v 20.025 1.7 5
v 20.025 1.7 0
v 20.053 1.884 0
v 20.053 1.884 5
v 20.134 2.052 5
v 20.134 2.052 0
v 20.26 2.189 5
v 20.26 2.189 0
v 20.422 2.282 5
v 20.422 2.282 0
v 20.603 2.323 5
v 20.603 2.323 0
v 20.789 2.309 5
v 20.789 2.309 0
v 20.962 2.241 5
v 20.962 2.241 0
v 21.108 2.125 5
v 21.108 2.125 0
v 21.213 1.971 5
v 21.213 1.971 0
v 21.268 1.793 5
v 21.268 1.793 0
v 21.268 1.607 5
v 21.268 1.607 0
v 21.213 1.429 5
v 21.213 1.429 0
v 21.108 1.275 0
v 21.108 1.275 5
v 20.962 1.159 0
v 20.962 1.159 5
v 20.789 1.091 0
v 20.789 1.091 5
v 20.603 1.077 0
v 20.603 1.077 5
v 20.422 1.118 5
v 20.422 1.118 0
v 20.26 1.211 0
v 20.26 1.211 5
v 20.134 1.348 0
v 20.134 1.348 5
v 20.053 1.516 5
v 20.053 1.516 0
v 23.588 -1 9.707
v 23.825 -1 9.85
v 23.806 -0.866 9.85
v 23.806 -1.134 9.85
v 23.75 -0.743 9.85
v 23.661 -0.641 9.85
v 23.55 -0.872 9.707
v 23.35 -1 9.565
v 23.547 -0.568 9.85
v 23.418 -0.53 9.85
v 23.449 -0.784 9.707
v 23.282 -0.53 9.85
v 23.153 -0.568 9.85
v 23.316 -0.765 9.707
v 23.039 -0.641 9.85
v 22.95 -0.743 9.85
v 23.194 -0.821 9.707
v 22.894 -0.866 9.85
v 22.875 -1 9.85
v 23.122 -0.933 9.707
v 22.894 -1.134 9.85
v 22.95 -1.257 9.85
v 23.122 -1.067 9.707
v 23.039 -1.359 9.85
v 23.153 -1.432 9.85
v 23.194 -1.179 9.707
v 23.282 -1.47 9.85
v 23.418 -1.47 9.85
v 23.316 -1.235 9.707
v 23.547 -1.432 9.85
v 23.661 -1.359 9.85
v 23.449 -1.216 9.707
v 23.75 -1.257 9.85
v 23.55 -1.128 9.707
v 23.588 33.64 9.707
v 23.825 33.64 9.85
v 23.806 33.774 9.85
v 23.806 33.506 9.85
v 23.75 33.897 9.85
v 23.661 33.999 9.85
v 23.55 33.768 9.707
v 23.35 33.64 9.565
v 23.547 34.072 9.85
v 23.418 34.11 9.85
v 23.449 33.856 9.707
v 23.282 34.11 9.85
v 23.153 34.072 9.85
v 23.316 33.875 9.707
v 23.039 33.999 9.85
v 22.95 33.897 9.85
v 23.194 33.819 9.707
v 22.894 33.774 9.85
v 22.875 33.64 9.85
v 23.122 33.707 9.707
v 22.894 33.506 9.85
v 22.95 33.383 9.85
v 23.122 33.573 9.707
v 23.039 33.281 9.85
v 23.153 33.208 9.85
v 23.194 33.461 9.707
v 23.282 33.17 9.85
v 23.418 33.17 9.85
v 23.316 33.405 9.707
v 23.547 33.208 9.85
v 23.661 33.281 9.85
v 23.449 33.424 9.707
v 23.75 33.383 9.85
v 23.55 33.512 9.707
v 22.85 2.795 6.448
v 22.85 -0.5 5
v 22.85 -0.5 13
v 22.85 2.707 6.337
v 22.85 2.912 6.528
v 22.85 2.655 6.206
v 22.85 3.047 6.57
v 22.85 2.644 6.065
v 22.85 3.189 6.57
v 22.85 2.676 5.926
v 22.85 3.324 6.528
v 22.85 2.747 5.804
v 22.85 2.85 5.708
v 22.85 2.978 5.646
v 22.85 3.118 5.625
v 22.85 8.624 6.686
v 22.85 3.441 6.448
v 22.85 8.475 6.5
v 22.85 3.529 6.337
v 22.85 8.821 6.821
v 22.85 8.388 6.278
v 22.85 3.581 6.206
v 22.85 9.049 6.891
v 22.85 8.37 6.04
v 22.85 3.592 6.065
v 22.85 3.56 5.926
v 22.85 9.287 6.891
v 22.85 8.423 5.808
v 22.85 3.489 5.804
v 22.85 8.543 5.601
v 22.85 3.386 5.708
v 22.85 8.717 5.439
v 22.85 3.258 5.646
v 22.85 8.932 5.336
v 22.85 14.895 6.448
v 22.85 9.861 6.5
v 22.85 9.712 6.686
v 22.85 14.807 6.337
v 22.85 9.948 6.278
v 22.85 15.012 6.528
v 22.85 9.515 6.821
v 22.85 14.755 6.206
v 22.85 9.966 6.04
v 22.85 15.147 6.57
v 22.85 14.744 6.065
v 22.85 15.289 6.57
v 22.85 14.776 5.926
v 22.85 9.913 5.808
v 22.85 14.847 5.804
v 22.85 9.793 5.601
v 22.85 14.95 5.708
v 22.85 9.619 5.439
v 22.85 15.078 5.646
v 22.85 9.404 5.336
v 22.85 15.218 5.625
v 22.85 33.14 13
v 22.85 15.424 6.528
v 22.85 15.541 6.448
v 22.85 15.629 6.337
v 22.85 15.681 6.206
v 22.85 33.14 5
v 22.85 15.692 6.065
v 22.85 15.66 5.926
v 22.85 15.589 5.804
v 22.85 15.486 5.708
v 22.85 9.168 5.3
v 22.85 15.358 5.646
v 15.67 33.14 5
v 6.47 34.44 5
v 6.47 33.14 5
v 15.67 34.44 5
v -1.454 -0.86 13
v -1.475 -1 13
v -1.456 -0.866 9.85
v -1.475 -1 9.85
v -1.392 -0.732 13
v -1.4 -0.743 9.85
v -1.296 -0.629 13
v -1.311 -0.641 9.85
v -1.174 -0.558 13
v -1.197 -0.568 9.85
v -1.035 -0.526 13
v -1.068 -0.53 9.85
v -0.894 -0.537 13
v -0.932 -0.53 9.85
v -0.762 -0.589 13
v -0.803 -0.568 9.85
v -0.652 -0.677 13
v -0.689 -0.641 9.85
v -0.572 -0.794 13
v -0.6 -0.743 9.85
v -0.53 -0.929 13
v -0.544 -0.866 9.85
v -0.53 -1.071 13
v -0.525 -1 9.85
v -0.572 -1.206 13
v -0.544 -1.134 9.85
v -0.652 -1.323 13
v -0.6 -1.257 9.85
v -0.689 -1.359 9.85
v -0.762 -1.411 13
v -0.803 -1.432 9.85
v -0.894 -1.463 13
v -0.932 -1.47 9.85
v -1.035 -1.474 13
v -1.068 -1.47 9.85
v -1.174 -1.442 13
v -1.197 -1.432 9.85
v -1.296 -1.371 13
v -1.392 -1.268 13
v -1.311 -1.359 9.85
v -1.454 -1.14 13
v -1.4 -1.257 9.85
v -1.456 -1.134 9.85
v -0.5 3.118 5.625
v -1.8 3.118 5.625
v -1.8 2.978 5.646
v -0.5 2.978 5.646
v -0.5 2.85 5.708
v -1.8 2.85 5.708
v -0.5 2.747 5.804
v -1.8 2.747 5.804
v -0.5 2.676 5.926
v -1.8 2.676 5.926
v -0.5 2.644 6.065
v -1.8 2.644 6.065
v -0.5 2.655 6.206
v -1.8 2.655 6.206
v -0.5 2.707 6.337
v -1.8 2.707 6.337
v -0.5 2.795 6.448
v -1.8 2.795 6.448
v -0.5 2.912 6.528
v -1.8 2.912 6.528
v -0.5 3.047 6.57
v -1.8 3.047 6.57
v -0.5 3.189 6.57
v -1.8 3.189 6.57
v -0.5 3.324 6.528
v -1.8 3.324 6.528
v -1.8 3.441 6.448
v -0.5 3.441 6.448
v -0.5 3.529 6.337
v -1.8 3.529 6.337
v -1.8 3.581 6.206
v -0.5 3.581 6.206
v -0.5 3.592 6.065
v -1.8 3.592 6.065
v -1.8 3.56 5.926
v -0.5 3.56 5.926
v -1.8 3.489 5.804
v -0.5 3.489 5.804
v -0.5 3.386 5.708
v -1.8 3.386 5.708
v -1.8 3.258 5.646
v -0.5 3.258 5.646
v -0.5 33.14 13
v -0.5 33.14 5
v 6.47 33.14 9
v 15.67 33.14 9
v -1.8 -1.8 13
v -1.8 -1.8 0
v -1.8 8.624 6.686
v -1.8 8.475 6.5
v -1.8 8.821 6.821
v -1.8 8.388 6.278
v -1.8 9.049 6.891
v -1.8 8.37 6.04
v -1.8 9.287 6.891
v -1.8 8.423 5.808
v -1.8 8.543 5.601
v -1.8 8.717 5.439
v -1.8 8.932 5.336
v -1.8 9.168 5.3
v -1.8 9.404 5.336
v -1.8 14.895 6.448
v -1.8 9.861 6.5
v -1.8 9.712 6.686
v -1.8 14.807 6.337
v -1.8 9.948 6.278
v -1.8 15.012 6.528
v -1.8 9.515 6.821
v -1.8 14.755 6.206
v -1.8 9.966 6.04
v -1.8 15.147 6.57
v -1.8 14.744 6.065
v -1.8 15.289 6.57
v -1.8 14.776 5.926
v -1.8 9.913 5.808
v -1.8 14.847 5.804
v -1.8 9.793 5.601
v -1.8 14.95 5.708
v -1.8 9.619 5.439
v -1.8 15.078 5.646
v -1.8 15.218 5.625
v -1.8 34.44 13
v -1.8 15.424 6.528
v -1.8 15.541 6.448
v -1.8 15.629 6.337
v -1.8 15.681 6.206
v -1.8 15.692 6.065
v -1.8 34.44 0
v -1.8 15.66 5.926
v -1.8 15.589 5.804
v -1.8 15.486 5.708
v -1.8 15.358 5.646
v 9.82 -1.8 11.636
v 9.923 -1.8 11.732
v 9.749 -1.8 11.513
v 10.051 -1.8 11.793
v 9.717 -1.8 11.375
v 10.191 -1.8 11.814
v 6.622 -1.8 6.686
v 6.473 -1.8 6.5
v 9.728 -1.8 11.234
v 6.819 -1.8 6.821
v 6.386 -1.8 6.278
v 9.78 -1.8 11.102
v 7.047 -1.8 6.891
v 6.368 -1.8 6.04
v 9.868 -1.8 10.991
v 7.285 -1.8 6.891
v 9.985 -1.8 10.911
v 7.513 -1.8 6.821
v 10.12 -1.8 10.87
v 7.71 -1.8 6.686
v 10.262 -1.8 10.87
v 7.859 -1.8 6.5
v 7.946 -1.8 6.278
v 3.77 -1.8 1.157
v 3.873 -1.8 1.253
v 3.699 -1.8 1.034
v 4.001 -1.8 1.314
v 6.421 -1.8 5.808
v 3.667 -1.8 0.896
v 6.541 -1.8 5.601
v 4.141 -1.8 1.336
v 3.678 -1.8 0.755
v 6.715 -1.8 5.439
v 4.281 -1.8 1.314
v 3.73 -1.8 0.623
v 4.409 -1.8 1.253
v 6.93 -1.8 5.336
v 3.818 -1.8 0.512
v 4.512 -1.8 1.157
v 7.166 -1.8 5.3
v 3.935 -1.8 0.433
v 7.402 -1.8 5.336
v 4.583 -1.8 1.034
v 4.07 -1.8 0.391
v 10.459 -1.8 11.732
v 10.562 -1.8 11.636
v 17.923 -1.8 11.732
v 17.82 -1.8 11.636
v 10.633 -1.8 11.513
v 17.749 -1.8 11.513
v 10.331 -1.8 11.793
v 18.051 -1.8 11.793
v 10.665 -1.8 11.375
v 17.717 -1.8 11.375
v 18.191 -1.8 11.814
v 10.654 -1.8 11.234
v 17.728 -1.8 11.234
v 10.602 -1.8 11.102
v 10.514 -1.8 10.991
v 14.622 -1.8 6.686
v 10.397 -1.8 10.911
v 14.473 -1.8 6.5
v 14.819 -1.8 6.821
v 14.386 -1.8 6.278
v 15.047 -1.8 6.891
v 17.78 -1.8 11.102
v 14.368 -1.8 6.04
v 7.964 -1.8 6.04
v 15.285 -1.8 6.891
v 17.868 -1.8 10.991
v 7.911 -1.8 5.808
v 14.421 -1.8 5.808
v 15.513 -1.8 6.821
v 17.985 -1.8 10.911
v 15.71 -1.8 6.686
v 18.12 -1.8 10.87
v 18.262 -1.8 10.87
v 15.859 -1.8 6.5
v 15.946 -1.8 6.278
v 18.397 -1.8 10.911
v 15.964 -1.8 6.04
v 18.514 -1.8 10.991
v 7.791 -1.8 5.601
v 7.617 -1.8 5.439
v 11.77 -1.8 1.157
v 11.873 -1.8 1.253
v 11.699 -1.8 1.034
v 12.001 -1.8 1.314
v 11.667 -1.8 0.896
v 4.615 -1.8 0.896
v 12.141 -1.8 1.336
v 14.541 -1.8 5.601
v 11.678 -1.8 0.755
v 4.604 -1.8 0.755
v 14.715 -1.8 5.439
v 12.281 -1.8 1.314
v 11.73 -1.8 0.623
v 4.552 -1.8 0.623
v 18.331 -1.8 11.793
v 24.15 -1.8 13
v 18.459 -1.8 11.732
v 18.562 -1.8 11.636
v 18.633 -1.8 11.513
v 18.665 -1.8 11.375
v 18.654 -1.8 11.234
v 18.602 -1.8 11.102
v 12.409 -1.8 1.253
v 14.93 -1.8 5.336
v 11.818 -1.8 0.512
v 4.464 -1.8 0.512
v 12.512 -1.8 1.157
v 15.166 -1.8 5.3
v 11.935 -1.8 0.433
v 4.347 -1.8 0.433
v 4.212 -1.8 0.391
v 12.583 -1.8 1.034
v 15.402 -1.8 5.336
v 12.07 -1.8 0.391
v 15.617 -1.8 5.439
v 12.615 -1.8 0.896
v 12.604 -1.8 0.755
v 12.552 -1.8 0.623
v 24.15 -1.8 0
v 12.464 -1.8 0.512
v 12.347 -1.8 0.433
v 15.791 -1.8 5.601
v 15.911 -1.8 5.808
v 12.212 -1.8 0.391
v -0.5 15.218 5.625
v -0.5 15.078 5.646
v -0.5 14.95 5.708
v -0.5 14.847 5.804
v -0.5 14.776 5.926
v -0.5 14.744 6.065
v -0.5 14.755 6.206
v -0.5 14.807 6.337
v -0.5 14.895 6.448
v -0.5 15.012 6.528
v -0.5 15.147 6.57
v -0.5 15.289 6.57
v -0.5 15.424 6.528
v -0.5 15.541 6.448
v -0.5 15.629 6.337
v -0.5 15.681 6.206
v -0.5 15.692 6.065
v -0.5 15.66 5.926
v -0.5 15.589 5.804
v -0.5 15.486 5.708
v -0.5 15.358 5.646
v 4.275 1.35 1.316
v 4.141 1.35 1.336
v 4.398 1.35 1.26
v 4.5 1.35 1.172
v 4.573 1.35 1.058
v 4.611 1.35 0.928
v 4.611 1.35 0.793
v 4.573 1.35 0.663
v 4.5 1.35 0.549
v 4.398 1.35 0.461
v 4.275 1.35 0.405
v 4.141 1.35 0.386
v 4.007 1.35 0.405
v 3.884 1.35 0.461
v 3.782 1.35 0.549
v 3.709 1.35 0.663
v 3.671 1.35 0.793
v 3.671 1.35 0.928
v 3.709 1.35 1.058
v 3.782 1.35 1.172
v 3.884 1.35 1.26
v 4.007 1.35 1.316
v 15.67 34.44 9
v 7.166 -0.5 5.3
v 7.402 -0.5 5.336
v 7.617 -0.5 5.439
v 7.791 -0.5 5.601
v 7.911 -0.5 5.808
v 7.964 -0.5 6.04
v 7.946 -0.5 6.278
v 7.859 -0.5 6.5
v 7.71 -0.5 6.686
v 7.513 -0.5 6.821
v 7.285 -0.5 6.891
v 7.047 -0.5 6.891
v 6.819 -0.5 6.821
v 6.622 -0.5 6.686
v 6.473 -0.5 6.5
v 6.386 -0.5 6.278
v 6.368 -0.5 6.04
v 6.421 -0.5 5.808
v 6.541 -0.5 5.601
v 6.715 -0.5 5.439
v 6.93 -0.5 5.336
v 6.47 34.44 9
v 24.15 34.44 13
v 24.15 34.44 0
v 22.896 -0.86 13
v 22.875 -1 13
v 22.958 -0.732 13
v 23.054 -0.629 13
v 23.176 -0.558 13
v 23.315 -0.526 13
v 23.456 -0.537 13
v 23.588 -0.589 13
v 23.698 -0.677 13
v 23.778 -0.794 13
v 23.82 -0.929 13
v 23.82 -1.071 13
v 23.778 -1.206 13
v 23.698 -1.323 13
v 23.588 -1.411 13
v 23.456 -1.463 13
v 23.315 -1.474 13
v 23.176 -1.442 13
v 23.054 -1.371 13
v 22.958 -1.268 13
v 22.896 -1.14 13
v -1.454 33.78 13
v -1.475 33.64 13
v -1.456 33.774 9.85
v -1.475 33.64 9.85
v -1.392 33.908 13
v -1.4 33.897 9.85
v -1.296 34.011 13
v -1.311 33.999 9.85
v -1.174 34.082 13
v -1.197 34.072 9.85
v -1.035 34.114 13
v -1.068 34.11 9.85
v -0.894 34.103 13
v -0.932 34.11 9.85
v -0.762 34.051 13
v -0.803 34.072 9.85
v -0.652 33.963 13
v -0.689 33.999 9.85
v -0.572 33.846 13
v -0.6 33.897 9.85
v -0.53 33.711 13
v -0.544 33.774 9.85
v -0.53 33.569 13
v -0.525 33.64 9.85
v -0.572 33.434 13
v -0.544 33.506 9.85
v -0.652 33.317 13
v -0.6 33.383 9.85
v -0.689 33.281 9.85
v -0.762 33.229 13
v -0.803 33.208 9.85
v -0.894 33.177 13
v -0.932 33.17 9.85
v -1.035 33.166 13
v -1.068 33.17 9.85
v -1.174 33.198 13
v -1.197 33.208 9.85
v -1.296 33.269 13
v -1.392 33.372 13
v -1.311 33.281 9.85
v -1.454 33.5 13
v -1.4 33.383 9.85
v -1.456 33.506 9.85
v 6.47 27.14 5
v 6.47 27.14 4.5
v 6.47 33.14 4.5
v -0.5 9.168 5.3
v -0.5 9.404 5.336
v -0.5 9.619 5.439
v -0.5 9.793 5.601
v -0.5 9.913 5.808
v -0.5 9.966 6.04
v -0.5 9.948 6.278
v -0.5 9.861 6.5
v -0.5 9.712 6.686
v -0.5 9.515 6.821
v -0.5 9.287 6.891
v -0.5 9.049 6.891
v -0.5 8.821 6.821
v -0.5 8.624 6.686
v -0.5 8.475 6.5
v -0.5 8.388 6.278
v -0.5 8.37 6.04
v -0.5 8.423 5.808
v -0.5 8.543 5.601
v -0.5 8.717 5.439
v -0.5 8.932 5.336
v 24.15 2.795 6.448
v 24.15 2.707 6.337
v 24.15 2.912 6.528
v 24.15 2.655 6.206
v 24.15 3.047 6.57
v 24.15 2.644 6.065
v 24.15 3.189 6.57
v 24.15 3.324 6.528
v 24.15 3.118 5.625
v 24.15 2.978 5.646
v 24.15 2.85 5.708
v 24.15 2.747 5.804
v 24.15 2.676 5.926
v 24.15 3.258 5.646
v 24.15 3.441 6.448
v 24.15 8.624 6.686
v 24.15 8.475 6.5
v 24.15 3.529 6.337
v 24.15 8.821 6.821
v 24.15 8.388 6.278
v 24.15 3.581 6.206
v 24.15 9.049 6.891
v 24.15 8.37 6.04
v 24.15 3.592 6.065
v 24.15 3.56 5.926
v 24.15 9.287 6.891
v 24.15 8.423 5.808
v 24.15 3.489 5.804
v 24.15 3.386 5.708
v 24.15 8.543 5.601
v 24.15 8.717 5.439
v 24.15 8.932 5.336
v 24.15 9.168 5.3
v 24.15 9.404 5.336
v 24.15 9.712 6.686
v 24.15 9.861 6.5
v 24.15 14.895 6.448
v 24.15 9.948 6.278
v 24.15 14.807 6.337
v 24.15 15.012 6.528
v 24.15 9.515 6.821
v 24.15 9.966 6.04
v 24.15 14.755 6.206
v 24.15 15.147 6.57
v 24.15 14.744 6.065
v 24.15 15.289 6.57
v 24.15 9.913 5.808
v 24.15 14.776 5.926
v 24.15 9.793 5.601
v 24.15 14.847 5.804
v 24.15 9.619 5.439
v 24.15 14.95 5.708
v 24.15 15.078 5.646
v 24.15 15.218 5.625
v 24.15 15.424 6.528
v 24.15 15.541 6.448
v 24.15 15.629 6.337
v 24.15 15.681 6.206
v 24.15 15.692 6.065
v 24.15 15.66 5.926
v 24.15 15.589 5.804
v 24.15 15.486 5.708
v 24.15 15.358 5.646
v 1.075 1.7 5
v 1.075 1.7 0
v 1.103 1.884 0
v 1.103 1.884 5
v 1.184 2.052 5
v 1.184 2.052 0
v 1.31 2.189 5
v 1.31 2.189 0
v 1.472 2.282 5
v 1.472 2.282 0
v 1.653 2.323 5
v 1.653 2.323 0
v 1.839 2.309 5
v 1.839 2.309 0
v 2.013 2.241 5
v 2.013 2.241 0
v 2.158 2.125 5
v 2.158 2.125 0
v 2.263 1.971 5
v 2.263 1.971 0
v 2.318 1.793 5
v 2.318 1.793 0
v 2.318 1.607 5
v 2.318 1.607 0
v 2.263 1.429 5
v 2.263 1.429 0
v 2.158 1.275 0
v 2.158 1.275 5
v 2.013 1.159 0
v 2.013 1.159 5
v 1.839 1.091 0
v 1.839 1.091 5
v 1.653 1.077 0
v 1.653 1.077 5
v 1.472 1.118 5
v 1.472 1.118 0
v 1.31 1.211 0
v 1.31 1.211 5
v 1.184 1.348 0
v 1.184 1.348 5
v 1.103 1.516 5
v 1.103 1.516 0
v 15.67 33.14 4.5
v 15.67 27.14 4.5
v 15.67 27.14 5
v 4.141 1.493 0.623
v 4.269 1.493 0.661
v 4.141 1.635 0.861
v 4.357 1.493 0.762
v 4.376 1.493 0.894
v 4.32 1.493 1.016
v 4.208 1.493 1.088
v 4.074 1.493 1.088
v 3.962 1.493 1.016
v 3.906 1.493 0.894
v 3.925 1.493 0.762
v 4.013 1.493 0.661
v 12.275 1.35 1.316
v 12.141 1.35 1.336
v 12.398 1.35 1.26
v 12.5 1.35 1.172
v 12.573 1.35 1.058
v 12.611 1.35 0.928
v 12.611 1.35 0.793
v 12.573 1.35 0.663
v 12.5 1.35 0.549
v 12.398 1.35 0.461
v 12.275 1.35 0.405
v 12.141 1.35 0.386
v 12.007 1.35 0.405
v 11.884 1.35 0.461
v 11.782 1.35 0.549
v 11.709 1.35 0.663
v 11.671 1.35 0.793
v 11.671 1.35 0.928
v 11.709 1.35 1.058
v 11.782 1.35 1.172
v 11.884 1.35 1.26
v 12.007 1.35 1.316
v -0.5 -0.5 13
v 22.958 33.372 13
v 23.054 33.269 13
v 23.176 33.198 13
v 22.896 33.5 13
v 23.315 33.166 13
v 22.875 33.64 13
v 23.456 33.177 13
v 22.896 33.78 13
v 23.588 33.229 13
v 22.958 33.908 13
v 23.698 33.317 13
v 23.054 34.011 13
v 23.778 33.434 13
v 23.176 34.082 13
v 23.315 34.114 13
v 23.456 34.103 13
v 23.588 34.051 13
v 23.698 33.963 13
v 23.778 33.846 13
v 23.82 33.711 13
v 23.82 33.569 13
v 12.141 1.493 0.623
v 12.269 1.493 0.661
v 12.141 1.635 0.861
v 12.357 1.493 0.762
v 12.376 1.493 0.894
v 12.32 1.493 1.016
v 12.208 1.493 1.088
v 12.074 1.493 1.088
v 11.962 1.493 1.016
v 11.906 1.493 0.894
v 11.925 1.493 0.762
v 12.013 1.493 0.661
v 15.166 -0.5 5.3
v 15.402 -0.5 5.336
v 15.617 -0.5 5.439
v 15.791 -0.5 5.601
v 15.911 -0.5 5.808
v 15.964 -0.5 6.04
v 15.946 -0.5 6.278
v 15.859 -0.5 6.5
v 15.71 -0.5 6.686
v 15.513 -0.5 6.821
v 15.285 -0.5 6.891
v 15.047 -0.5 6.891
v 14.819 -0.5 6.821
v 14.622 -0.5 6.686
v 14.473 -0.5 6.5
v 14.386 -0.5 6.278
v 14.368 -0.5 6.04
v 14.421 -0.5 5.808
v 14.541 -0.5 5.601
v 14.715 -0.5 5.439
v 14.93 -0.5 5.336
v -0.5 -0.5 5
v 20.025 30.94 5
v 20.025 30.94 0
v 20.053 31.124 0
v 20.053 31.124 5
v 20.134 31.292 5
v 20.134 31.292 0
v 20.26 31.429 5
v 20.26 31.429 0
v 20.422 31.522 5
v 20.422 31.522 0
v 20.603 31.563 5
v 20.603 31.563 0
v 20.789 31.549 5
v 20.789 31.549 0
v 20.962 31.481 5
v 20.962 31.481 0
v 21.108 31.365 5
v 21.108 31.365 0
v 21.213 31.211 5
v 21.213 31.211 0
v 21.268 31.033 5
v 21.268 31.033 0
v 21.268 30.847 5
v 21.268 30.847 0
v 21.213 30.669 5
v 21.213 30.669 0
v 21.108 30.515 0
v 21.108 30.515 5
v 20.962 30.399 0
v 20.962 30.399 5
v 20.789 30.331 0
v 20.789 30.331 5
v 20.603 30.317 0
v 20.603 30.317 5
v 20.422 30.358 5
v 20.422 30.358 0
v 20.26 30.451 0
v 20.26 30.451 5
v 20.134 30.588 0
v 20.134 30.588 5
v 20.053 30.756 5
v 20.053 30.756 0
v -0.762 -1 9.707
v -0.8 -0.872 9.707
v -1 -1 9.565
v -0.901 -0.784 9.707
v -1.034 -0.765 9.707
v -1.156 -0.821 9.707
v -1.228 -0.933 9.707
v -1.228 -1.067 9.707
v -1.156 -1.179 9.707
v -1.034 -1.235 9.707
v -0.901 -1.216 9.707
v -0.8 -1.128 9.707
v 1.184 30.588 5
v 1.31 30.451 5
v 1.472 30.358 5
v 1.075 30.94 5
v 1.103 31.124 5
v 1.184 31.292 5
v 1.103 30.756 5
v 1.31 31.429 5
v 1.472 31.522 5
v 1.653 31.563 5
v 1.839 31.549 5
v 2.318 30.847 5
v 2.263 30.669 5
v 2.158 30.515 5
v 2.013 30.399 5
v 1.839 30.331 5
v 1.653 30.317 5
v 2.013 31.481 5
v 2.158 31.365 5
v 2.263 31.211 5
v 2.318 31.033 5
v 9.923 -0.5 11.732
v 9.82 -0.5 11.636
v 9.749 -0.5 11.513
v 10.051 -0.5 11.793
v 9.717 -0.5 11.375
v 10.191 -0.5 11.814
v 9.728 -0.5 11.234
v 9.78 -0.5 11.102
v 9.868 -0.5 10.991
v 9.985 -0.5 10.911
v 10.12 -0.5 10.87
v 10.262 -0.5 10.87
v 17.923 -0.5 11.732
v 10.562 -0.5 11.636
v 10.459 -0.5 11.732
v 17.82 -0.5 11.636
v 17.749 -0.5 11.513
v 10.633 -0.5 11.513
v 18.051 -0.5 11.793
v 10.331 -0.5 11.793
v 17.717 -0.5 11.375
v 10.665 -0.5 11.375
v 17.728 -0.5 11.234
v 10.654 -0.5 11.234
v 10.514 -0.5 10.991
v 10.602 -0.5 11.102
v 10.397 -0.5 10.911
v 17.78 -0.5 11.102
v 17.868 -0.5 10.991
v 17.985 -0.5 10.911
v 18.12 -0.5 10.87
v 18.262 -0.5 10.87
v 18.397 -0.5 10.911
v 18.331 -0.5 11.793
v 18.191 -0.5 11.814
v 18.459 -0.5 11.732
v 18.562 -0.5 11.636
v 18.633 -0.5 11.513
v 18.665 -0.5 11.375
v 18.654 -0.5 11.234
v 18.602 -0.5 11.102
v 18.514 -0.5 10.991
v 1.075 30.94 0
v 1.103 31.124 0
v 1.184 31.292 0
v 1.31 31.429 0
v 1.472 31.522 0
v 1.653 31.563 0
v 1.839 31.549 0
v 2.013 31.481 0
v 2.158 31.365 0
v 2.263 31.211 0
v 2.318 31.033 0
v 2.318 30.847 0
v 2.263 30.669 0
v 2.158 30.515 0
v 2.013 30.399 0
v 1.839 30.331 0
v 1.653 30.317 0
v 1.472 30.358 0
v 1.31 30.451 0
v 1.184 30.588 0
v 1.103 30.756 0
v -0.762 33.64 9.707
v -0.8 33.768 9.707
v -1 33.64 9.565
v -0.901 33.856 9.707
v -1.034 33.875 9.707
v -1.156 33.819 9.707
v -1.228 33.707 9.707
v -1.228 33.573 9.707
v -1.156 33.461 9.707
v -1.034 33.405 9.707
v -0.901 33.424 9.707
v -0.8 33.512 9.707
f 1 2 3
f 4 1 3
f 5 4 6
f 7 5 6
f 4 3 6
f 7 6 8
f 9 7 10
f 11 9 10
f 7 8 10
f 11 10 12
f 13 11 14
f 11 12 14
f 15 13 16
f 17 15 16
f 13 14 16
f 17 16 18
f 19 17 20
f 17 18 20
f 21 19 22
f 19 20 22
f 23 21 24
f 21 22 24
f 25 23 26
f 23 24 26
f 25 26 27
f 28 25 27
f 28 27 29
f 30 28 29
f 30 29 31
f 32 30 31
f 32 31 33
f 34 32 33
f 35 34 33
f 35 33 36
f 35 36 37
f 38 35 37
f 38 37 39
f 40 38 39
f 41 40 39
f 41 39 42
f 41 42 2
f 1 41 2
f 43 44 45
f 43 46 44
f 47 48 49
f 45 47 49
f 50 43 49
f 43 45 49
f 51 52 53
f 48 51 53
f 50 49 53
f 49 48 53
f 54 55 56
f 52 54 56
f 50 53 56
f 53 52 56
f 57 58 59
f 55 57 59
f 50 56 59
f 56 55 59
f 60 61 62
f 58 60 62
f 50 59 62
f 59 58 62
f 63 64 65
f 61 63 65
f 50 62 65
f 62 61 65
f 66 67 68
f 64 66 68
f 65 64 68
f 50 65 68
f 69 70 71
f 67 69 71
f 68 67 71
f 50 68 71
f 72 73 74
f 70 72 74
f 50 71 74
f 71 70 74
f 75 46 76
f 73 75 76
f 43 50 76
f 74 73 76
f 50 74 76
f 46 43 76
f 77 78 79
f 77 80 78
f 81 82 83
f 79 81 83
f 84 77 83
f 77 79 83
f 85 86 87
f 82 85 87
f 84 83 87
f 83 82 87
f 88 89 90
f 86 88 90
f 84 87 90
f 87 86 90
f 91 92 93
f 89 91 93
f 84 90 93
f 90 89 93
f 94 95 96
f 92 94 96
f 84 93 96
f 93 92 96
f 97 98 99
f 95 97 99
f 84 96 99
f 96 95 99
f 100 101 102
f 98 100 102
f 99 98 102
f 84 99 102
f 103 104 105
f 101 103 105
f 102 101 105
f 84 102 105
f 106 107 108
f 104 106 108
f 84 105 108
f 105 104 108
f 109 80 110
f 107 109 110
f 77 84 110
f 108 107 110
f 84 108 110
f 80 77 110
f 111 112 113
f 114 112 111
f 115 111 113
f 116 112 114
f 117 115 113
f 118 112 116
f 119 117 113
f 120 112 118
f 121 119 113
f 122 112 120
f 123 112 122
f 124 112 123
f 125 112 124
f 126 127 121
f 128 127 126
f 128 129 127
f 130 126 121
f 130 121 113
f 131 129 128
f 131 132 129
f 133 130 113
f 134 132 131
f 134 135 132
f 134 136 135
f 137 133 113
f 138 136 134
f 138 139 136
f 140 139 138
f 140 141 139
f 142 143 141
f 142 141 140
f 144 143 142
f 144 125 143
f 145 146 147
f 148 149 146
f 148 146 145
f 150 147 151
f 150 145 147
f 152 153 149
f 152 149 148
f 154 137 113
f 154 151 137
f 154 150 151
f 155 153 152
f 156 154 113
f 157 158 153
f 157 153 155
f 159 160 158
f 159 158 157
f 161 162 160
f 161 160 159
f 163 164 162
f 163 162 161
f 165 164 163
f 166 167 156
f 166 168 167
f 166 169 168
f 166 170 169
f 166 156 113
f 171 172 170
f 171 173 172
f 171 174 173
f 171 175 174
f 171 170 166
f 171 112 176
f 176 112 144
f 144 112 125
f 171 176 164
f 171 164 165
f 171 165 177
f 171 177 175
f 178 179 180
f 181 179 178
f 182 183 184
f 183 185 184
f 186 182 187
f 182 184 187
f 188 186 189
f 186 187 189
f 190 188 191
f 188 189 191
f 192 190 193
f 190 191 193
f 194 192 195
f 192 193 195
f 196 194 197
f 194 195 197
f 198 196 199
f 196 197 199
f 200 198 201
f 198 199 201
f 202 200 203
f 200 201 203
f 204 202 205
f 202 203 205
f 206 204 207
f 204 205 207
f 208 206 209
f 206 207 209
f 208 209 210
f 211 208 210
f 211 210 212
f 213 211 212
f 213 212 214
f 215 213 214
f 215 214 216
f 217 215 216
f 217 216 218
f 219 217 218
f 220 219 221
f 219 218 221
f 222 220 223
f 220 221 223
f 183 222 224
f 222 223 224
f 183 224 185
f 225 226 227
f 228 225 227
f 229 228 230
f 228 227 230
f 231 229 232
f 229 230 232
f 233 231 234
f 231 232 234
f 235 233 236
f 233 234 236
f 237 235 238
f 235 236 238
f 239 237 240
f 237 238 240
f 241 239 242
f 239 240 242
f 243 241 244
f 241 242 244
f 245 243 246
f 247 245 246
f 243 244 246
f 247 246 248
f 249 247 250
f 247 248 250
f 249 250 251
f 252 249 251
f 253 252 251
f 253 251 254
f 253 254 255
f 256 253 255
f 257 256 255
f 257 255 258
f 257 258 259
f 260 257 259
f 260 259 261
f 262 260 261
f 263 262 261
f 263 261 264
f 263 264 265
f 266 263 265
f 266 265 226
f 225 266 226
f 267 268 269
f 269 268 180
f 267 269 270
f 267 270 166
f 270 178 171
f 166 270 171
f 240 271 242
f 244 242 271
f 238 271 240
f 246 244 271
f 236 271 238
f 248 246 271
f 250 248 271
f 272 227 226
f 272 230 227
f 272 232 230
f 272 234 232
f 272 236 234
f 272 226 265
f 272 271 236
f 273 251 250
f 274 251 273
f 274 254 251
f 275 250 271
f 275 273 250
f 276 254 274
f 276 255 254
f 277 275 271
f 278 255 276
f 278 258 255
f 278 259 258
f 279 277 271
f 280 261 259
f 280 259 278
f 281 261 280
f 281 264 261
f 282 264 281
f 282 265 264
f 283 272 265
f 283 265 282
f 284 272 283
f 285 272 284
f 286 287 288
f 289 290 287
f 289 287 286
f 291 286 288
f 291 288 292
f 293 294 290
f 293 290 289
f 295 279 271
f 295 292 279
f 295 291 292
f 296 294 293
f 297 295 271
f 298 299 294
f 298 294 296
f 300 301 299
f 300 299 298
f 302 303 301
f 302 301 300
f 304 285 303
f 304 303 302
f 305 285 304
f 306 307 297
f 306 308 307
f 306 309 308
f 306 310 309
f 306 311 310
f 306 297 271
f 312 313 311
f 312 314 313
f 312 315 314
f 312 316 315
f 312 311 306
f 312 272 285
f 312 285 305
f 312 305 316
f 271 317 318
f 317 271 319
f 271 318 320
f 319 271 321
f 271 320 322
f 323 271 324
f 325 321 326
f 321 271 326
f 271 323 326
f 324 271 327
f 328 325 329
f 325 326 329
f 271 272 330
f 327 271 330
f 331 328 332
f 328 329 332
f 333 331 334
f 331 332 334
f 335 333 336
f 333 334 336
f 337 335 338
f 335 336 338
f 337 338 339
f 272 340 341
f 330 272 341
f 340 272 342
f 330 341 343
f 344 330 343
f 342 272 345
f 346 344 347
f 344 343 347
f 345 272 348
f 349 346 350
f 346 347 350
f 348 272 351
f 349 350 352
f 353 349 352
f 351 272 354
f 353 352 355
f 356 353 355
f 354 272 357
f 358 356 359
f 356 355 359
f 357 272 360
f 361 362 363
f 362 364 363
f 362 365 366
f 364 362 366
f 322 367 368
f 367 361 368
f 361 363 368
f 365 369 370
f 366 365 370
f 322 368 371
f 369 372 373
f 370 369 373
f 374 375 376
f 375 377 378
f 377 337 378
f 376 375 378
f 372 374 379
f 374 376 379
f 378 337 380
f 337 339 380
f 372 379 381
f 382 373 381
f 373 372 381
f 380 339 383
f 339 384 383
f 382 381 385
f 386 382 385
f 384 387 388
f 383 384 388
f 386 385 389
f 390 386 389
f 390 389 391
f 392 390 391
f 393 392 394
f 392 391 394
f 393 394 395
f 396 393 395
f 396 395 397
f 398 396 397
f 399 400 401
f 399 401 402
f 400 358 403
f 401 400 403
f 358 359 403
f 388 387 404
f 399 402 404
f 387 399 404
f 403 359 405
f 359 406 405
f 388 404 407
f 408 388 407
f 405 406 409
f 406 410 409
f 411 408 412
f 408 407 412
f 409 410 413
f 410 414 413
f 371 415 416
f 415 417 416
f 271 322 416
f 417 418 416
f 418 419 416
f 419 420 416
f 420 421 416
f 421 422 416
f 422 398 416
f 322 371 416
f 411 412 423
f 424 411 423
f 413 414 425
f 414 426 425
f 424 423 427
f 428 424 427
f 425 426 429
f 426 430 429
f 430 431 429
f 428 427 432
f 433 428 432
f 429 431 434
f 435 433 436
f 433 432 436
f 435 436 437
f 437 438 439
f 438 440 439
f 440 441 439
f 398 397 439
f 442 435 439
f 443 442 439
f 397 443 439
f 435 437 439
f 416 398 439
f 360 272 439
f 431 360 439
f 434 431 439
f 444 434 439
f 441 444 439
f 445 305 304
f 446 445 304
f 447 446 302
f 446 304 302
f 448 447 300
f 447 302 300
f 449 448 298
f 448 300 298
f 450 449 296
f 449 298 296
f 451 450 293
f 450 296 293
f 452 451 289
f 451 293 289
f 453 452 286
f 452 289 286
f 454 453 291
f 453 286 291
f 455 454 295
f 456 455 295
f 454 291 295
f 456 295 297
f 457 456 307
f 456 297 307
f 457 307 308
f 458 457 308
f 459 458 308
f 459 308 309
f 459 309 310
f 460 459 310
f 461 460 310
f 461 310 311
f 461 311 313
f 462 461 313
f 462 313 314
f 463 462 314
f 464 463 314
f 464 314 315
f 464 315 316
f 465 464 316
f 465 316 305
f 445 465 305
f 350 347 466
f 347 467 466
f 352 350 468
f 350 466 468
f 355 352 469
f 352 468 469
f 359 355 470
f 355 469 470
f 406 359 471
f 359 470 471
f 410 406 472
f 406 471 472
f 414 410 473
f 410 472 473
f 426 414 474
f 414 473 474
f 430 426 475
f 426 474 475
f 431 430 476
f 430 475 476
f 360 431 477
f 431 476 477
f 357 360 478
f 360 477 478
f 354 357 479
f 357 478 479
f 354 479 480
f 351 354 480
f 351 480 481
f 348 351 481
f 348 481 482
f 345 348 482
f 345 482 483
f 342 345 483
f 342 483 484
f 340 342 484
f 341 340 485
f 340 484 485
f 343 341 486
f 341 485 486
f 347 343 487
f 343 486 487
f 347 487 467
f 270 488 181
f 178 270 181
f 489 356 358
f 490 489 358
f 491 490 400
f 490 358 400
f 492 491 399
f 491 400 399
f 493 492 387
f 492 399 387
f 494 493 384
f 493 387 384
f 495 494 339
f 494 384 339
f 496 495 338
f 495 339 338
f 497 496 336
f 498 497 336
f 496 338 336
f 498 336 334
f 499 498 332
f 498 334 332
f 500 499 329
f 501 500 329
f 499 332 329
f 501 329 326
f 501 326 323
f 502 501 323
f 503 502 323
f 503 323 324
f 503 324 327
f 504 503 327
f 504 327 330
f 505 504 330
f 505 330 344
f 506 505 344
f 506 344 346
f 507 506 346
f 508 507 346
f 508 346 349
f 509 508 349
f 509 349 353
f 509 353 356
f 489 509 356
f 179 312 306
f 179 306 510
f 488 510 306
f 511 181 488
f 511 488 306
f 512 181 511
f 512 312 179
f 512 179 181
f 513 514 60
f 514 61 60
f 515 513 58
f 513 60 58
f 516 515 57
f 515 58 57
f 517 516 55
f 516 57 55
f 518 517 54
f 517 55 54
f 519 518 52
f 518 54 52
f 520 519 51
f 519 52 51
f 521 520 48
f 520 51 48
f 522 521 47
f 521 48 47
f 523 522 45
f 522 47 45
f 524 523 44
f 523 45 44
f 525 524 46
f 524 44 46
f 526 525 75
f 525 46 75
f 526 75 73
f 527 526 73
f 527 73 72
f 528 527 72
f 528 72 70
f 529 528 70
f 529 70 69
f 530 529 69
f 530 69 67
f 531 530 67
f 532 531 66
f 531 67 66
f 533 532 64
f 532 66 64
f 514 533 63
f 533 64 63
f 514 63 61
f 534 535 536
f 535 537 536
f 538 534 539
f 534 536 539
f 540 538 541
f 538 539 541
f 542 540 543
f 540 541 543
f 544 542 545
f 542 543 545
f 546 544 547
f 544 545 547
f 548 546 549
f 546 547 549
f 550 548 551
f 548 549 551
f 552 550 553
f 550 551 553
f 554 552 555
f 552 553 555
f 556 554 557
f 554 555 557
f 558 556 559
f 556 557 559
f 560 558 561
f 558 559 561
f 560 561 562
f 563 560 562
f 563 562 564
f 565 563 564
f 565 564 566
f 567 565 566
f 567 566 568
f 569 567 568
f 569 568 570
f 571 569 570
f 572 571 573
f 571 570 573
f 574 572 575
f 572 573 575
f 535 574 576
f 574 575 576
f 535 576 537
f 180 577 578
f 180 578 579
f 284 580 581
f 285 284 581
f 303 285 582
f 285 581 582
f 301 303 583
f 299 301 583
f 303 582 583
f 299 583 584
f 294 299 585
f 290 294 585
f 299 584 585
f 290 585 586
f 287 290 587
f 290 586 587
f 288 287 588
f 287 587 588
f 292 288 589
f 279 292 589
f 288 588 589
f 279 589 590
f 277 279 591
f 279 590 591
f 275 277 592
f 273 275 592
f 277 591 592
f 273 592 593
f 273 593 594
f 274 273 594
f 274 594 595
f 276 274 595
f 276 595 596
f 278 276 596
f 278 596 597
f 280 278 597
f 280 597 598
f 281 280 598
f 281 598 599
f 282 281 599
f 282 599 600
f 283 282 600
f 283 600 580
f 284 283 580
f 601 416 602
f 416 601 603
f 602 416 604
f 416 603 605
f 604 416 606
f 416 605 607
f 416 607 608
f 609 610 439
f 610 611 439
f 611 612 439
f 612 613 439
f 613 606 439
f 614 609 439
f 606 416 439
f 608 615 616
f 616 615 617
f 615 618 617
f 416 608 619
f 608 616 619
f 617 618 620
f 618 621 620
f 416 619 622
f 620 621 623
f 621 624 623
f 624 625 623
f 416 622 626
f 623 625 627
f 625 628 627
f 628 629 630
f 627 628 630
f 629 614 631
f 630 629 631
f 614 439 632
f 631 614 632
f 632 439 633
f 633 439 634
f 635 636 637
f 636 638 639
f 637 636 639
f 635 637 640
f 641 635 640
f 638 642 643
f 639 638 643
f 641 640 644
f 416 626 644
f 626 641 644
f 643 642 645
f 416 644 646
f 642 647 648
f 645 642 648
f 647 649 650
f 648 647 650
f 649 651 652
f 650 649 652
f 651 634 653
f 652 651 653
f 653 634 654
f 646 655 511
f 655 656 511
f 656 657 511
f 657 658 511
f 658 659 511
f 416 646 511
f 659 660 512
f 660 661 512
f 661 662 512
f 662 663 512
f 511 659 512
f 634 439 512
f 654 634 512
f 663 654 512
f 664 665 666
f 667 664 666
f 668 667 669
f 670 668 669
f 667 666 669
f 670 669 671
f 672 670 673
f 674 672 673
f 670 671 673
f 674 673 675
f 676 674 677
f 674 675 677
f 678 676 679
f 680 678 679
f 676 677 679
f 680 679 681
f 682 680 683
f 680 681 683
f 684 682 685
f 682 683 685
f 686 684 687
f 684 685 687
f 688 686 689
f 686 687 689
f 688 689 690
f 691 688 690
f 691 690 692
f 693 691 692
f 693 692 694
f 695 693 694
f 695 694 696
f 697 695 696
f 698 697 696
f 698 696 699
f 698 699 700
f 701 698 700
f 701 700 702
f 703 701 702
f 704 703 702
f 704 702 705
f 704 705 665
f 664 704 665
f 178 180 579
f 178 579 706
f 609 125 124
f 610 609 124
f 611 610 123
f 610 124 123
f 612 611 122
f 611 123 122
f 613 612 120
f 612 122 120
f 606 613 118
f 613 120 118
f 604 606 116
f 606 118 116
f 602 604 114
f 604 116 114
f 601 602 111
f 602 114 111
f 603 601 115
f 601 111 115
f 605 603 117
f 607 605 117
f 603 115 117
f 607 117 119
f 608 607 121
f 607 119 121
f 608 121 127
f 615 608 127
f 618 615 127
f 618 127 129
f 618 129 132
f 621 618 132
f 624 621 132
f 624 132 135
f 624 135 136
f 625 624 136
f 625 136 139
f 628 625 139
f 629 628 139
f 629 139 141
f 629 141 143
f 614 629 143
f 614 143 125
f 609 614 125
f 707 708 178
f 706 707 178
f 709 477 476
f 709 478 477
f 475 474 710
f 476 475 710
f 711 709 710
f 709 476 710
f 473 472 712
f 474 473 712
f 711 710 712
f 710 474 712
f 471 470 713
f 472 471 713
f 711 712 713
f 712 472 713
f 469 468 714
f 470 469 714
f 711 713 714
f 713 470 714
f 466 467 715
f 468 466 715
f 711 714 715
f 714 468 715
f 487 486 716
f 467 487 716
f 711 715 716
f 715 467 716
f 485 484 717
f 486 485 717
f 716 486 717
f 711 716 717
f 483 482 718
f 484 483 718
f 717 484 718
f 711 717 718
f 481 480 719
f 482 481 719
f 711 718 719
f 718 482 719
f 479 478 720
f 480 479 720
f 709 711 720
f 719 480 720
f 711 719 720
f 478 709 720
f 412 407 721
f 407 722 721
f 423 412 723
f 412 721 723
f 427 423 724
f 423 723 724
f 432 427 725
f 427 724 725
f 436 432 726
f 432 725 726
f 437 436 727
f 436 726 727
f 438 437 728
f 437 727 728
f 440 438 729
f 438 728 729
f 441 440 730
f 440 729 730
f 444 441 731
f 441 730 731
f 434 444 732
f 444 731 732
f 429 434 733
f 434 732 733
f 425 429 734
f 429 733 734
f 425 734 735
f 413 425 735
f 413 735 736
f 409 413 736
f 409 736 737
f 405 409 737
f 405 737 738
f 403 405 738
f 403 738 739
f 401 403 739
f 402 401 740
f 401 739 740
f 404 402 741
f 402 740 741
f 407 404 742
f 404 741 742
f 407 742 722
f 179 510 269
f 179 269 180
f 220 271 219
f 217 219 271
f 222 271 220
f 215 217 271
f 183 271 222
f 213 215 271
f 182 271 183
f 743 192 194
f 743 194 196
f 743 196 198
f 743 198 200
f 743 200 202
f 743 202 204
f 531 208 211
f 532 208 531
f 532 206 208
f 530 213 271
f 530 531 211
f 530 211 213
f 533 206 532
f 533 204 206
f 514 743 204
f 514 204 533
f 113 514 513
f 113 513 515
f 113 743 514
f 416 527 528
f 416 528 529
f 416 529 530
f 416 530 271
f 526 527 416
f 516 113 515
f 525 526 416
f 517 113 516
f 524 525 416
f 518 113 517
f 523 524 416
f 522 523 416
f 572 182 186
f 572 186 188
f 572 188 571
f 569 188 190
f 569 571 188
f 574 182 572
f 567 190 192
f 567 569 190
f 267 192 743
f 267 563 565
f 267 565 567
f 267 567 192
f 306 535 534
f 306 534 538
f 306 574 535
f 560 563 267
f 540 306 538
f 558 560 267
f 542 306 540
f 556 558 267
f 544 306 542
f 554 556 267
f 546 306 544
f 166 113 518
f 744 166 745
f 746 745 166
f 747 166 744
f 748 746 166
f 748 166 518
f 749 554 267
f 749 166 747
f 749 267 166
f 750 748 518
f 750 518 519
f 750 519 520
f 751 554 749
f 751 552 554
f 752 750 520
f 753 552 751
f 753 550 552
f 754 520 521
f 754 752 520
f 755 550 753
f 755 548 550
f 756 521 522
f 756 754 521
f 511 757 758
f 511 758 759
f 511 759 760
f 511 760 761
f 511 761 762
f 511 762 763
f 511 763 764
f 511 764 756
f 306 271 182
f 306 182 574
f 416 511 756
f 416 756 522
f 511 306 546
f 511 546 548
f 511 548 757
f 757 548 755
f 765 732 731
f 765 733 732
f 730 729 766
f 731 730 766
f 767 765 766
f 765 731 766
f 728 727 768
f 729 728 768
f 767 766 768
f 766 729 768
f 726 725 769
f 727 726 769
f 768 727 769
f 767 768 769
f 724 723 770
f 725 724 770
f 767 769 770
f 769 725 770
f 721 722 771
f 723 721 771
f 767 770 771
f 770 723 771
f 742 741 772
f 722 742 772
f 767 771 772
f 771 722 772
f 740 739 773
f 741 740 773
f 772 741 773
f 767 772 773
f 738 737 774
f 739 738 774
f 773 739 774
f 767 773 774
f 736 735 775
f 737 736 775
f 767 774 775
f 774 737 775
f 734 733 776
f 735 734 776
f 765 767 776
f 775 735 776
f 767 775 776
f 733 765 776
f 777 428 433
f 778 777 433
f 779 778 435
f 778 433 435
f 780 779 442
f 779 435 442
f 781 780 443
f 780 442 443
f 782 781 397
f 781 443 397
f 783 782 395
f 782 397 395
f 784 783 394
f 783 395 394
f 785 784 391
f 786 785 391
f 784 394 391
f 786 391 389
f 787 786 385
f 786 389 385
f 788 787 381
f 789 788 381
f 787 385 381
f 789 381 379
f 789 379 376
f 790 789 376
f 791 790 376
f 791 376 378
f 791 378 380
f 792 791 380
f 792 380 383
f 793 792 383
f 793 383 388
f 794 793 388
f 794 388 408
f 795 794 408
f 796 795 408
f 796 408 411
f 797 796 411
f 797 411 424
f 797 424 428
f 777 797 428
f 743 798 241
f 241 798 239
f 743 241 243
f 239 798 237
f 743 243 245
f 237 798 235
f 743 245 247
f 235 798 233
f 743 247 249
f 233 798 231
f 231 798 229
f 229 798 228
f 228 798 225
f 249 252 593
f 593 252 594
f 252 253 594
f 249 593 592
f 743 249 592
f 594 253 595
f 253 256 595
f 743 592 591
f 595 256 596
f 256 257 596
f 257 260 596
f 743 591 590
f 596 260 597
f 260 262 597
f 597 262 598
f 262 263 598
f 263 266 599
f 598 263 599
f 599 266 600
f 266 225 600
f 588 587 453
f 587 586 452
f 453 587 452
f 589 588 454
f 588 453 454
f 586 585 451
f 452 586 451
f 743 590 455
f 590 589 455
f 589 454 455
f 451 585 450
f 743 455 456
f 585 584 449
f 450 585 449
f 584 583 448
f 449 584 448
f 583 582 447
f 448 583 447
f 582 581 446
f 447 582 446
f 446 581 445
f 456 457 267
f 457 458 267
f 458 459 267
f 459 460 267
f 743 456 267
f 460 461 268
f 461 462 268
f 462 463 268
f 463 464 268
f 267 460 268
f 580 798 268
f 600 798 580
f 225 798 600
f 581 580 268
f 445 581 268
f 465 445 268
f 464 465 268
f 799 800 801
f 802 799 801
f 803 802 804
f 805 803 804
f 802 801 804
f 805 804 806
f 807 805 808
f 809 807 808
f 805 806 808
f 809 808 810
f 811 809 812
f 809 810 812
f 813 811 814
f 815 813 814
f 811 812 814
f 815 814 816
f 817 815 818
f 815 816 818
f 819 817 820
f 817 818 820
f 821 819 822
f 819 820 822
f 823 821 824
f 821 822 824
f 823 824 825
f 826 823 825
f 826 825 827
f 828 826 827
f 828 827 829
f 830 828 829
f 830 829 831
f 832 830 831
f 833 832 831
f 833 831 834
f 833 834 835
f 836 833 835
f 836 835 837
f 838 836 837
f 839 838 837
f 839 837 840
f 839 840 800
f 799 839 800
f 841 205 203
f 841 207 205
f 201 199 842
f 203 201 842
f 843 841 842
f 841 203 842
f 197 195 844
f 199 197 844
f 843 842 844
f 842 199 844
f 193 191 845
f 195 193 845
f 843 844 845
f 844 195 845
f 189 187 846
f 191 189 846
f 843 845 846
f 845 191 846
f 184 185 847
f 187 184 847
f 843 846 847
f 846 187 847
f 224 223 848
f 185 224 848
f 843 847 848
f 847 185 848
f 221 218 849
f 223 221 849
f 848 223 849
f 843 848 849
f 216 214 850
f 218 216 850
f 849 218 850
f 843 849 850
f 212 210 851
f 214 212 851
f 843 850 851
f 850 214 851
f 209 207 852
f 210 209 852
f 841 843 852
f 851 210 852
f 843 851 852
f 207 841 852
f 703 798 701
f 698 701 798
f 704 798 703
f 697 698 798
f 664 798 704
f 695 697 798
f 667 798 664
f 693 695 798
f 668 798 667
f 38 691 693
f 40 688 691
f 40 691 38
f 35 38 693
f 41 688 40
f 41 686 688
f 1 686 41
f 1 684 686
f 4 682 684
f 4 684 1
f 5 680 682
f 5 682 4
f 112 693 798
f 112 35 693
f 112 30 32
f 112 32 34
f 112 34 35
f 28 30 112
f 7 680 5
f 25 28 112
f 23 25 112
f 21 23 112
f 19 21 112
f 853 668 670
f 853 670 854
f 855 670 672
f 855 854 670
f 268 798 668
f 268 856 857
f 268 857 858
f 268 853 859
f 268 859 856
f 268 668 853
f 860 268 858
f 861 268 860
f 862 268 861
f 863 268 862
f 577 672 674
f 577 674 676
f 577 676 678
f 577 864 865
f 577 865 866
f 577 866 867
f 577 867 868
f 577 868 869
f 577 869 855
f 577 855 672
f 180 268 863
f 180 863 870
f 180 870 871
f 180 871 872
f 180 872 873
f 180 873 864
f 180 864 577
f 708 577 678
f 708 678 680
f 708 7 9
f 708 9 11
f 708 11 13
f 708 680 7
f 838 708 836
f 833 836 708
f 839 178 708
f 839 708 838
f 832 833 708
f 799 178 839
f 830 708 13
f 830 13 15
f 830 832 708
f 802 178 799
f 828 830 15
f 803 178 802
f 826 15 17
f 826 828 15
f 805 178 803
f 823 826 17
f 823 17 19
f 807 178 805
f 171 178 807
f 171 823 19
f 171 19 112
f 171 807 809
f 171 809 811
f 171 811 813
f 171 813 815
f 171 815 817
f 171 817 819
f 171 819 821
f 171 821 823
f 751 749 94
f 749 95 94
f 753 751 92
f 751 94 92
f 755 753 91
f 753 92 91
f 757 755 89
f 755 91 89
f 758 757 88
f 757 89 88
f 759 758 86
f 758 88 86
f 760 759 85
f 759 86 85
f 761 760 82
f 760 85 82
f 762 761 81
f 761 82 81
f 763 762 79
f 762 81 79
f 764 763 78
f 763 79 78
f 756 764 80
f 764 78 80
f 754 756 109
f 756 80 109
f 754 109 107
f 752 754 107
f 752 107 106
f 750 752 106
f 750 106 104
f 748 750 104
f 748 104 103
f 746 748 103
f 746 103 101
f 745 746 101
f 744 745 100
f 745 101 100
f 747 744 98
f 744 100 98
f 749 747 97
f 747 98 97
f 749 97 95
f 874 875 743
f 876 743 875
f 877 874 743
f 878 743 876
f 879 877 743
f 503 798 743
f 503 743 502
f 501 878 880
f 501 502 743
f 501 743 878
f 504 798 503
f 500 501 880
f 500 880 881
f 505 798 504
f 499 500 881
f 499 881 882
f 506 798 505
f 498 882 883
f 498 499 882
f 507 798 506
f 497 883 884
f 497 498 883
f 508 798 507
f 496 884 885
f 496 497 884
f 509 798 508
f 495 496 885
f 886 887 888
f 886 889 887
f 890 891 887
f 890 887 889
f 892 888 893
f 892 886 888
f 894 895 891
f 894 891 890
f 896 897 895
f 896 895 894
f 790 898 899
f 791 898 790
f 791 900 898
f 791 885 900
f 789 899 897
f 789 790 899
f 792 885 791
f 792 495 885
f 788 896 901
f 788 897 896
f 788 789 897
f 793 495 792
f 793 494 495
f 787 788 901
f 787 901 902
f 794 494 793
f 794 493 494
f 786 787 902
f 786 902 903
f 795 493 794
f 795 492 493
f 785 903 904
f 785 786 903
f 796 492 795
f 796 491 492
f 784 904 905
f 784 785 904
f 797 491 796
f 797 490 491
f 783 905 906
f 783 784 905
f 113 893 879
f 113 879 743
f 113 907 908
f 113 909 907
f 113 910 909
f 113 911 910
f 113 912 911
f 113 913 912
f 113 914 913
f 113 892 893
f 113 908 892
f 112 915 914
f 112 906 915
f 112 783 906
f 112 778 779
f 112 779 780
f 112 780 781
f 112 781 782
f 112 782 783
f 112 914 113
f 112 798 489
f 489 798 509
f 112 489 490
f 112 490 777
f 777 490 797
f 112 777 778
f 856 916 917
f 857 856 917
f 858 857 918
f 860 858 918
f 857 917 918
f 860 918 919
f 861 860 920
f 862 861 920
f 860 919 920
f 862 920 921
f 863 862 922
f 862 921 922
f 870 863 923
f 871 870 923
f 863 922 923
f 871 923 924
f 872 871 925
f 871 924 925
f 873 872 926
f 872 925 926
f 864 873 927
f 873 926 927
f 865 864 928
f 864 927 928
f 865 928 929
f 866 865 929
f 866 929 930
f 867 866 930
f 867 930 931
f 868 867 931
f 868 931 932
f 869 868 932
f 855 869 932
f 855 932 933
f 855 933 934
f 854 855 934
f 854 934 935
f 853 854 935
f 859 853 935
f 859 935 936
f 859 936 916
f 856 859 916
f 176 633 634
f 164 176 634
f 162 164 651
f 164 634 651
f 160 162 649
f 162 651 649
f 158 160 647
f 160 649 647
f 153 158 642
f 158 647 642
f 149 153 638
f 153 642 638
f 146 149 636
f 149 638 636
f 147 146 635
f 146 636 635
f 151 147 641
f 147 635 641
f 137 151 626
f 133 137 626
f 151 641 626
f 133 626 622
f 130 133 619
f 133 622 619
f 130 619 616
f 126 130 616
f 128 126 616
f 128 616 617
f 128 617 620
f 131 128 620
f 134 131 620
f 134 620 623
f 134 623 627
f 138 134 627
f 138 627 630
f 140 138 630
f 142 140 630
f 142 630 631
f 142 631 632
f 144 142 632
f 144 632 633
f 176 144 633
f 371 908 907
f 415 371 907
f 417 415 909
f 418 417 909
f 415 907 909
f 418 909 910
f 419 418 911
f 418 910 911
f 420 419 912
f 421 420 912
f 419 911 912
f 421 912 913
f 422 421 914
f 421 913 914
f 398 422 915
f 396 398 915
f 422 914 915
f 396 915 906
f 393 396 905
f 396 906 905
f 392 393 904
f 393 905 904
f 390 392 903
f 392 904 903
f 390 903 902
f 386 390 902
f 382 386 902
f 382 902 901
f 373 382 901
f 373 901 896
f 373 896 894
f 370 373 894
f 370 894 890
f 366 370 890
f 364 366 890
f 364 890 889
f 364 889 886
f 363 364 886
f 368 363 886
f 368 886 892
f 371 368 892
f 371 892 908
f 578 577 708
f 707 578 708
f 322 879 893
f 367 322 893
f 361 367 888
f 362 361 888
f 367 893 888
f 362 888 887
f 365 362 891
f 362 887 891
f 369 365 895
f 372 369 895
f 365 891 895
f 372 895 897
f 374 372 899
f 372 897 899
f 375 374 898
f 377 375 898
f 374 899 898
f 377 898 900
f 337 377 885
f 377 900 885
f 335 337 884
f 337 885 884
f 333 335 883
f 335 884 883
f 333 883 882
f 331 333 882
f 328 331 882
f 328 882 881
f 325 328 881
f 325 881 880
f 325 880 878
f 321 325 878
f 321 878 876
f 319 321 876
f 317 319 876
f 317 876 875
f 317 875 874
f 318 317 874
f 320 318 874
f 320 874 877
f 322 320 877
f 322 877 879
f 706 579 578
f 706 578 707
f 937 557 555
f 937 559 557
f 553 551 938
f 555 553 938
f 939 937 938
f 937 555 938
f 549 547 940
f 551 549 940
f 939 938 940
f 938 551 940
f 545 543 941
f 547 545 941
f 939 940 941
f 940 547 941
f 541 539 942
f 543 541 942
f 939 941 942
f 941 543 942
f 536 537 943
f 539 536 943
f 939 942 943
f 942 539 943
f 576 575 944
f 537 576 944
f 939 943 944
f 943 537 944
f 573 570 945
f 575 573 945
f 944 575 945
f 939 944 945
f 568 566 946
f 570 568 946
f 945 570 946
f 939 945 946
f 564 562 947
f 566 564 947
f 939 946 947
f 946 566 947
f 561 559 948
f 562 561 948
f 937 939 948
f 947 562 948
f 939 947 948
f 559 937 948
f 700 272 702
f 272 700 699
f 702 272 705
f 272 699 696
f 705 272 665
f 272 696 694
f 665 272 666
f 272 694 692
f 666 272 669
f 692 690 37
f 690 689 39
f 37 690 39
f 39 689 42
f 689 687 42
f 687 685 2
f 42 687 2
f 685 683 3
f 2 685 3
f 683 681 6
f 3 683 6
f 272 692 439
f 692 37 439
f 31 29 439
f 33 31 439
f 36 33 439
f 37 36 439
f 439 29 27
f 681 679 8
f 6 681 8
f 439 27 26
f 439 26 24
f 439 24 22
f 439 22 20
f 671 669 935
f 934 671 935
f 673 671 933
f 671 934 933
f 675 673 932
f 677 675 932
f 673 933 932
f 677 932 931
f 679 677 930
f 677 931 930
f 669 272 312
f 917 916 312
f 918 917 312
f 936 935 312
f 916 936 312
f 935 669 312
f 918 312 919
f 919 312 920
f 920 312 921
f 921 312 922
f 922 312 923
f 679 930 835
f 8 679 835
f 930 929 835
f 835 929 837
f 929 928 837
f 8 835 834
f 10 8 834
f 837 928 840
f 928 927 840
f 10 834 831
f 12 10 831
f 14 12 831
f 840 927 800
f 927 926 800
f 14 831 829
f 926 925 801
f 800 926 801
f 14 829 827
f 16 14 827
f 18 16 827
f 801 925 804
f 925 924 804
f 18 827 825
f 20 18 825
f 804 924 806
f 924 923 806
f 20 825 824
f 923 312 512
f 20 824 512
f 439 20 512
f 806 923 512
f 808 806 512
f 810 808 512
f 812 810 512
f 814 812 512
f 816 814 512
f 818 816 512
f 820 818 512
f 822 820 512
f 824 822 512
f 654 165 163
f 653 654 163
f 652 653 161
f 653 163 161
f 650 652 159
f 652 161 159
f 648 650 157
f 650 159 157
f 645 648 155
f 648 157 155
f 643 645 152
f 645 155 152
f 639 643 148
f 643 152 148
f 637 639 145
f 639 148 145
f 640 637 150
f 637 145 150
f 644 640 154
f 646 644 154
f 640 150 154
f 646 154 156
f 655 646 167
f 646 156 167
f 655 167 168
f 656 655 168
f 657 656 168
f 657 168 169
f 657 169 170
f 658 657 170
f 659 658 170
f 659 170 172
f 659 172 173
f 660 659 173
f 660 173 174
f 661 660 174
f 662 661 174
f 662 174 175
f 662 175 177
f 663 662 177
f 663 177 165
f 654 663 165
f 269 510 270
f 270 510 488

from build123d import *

# Parameters (mm, degrees)
SKETCH_1_W           = 25.95
SKETCH_1_H           = 36.24
EXTRUDE_4_DEPTH      = 5
SKETCH_1_4_W         = 25.95
SKETCH_1_4_H         = 36.24
SKETCH_1_4_W_2       = 23.35
SKETCH_1_4_H_2       = 33.64
EXTRUDE_6_DEPTH      = 13
SKETCH_2_W           = 9.2
SKETCH_2_H           = 4
CUT_EXTRUDE_1_DEPTH  = 2
HOLE_WIZARD_M1_6_1_D = 1.25
SKETCH_5_W           = 9.2
SKETCH_5_H           = 6
CUT_EXTRUDE_2_DEPTH  = 0.5
SKETCH_6_R           = 0.8
CUT_EXTRUDE_3_DEPTH  = 46.039050834
M1_2X0_25_1_D        = 0.95
SKETCH_9_R           = 0.8
CUT_EXTRUDE_4_DEPTH  = 2
M1_2X0_25_2_D        = 0.95
M1_2X0_25_2_DEPTH    = 3.15
M1_2X0_25_2_TIP      = 0.285408794
M1_2X0_25_3_D        = 0.95
M1_2X0_25_3_DEPTH    = 3.15
M1_2X0_25_3_TIP      = 0.285408794


with BuildPart() as part:
    # 草图1 → 凸台-拉伸4 (new body)
    with BuildSketch(Plane.XY):
        with Locations((11.175, 16.32)):
            Rectangle(SKETCH_1_W, SKETCH_1_H)
    extrude(amount=EXTRUDE_4_DEPTH)

    # 草图1<4> → 凸台-拉伸6 (add)
    with BuildSketch(Plane.XY):
        with Locations((11.175, 16.32)):
            Rectangle(SKETCH_1_4_W, SKETCH_1_4_H)
        with Locations((11.175, 16.32)):
            Rectangle(SKETCH_1_4_W_2, SKETCH_1_4_H_2, mode=Mode.SUBTRACT)
    extrude(amount=EXTRUDE_6_DEPTH)

    # 草图2 → 切除-拉伸1 (cut)
    with BuildSketch(Plane(origin=(0, 34.44, 0), x_dir=(1, 0, 0), z_dir=(0, 1, 0))):
        with Locations((11.07, -7)):
            Rectangle(SKETCH_2_W, SKETCH_2_H)
    extrude(amount=-CUT_EXTRUDE_1_DEPTH, mode=Mode.SUBTRACT)

    # M1.6 螺纹孔1 (through all)
    with Locations(Plane.XY.offset(5)):
        with Locations((1.7, 1.7), (20.65, 1.7), (20.65, 30.94), (1.7, 30.94)):
            Hole(HOLE_WIZARD_M1_6_1_D / 2)

    # 草图5 → 切除-拉伸2 (cut)
    with BuildSketch(Plane.XY.offset(5)):
        with Locations((11.07, 30.14)):
            Rectangle(SKETCH_5_W, SKETCH_5_H)
    extrude(amount=-CUT_EXTRUDE_2_DEPTH, mode=Mode.SUBTRACT)

    # 草图6 → 切除-拉伸3 (cut, through all)
    with BuildSketch(Plane(origin=(24.15, 0, 0), x_dir=(0, 0, -1), z_dir=(1, 0, 0))):
        with Locations((-6.1, 9.168)):
            Circle(SKETCH_6_R)
    extrude(amount=-CUT_EXTRUDE_3_DEPTH, mode=Mode.SUBTRACT)

    # M1.2x0.25 螺纹孔1 (through all)
    with Locations(Plane(origin=(24.15, 15.218, 6.1), x_dir=(0, 0, 1), z_dir=(1, 0, 0))):
        with Locations((0, 0), (0, 12.1)):
            Hole(M1_2X0_25_1_D / 2)

    # 草图9 → 切除-拉伸4 (cut)
    with BuildSketch(Plane.XZ.offset(1.8)):
        with Locations((7.166, 6.1)):
            Circle(SKETCH_9_R)
        with Locations((15.166, 6.1)):
            Circle(SKETCH_9_R)
    extrude(amount=-CUT_EXTRUDE_4_DEPTH, mode=Mode.SUBTRACT)

    # M1.2x0.25 螺纹孔2
    with Locations(Plane(origin=(4.141, -1.8, 0.860546307), x_dir=(0, 0, -1), z_dir=(0, -1, 0))):
        with Locations((0, 0), (-10.478907386, 6.05), (0, 8), (-10.478907386, 14.05)):
            Hole(M1_2X0_25_2_D / 2, depth=M1_2X0_25_2_DEPTH)
            with Locations((0, 0, -(M1_2X0_25_2_DEPTH + M1_2X0_25_2_TIP / 2))):  # 118° drill point
                Cone(0, M1_2X0_25_2_D / 2, M1_2X0_25_2_TIP, mode=Mode.SUBTRACT)

    # M1.2x0.25 螺纹孔3
    with Locations(Plane(origin=(-1, 33.64, 13), x_dir=(1, 0, 0), z_dir=(0, 0, 1))):
        with Locations((0, 0), (24.35, 0), (0, -34.64), (24.35, -34.64)):
            Hole(M1_2X0_25_3_D / 2, depth=M1_2X0_25_3_DEPTH)
            with Locations((0, 0, -(M1_2X0_25_3_DEPTH + M1_2X0_25_3_TIP / 2))):  # 118° drill point
                Cone(0, M1_2X0_25_3_D / 2, M1_2X0_25_3_TIP, mode=Mode.SUBTRACT)


solid = part.part
